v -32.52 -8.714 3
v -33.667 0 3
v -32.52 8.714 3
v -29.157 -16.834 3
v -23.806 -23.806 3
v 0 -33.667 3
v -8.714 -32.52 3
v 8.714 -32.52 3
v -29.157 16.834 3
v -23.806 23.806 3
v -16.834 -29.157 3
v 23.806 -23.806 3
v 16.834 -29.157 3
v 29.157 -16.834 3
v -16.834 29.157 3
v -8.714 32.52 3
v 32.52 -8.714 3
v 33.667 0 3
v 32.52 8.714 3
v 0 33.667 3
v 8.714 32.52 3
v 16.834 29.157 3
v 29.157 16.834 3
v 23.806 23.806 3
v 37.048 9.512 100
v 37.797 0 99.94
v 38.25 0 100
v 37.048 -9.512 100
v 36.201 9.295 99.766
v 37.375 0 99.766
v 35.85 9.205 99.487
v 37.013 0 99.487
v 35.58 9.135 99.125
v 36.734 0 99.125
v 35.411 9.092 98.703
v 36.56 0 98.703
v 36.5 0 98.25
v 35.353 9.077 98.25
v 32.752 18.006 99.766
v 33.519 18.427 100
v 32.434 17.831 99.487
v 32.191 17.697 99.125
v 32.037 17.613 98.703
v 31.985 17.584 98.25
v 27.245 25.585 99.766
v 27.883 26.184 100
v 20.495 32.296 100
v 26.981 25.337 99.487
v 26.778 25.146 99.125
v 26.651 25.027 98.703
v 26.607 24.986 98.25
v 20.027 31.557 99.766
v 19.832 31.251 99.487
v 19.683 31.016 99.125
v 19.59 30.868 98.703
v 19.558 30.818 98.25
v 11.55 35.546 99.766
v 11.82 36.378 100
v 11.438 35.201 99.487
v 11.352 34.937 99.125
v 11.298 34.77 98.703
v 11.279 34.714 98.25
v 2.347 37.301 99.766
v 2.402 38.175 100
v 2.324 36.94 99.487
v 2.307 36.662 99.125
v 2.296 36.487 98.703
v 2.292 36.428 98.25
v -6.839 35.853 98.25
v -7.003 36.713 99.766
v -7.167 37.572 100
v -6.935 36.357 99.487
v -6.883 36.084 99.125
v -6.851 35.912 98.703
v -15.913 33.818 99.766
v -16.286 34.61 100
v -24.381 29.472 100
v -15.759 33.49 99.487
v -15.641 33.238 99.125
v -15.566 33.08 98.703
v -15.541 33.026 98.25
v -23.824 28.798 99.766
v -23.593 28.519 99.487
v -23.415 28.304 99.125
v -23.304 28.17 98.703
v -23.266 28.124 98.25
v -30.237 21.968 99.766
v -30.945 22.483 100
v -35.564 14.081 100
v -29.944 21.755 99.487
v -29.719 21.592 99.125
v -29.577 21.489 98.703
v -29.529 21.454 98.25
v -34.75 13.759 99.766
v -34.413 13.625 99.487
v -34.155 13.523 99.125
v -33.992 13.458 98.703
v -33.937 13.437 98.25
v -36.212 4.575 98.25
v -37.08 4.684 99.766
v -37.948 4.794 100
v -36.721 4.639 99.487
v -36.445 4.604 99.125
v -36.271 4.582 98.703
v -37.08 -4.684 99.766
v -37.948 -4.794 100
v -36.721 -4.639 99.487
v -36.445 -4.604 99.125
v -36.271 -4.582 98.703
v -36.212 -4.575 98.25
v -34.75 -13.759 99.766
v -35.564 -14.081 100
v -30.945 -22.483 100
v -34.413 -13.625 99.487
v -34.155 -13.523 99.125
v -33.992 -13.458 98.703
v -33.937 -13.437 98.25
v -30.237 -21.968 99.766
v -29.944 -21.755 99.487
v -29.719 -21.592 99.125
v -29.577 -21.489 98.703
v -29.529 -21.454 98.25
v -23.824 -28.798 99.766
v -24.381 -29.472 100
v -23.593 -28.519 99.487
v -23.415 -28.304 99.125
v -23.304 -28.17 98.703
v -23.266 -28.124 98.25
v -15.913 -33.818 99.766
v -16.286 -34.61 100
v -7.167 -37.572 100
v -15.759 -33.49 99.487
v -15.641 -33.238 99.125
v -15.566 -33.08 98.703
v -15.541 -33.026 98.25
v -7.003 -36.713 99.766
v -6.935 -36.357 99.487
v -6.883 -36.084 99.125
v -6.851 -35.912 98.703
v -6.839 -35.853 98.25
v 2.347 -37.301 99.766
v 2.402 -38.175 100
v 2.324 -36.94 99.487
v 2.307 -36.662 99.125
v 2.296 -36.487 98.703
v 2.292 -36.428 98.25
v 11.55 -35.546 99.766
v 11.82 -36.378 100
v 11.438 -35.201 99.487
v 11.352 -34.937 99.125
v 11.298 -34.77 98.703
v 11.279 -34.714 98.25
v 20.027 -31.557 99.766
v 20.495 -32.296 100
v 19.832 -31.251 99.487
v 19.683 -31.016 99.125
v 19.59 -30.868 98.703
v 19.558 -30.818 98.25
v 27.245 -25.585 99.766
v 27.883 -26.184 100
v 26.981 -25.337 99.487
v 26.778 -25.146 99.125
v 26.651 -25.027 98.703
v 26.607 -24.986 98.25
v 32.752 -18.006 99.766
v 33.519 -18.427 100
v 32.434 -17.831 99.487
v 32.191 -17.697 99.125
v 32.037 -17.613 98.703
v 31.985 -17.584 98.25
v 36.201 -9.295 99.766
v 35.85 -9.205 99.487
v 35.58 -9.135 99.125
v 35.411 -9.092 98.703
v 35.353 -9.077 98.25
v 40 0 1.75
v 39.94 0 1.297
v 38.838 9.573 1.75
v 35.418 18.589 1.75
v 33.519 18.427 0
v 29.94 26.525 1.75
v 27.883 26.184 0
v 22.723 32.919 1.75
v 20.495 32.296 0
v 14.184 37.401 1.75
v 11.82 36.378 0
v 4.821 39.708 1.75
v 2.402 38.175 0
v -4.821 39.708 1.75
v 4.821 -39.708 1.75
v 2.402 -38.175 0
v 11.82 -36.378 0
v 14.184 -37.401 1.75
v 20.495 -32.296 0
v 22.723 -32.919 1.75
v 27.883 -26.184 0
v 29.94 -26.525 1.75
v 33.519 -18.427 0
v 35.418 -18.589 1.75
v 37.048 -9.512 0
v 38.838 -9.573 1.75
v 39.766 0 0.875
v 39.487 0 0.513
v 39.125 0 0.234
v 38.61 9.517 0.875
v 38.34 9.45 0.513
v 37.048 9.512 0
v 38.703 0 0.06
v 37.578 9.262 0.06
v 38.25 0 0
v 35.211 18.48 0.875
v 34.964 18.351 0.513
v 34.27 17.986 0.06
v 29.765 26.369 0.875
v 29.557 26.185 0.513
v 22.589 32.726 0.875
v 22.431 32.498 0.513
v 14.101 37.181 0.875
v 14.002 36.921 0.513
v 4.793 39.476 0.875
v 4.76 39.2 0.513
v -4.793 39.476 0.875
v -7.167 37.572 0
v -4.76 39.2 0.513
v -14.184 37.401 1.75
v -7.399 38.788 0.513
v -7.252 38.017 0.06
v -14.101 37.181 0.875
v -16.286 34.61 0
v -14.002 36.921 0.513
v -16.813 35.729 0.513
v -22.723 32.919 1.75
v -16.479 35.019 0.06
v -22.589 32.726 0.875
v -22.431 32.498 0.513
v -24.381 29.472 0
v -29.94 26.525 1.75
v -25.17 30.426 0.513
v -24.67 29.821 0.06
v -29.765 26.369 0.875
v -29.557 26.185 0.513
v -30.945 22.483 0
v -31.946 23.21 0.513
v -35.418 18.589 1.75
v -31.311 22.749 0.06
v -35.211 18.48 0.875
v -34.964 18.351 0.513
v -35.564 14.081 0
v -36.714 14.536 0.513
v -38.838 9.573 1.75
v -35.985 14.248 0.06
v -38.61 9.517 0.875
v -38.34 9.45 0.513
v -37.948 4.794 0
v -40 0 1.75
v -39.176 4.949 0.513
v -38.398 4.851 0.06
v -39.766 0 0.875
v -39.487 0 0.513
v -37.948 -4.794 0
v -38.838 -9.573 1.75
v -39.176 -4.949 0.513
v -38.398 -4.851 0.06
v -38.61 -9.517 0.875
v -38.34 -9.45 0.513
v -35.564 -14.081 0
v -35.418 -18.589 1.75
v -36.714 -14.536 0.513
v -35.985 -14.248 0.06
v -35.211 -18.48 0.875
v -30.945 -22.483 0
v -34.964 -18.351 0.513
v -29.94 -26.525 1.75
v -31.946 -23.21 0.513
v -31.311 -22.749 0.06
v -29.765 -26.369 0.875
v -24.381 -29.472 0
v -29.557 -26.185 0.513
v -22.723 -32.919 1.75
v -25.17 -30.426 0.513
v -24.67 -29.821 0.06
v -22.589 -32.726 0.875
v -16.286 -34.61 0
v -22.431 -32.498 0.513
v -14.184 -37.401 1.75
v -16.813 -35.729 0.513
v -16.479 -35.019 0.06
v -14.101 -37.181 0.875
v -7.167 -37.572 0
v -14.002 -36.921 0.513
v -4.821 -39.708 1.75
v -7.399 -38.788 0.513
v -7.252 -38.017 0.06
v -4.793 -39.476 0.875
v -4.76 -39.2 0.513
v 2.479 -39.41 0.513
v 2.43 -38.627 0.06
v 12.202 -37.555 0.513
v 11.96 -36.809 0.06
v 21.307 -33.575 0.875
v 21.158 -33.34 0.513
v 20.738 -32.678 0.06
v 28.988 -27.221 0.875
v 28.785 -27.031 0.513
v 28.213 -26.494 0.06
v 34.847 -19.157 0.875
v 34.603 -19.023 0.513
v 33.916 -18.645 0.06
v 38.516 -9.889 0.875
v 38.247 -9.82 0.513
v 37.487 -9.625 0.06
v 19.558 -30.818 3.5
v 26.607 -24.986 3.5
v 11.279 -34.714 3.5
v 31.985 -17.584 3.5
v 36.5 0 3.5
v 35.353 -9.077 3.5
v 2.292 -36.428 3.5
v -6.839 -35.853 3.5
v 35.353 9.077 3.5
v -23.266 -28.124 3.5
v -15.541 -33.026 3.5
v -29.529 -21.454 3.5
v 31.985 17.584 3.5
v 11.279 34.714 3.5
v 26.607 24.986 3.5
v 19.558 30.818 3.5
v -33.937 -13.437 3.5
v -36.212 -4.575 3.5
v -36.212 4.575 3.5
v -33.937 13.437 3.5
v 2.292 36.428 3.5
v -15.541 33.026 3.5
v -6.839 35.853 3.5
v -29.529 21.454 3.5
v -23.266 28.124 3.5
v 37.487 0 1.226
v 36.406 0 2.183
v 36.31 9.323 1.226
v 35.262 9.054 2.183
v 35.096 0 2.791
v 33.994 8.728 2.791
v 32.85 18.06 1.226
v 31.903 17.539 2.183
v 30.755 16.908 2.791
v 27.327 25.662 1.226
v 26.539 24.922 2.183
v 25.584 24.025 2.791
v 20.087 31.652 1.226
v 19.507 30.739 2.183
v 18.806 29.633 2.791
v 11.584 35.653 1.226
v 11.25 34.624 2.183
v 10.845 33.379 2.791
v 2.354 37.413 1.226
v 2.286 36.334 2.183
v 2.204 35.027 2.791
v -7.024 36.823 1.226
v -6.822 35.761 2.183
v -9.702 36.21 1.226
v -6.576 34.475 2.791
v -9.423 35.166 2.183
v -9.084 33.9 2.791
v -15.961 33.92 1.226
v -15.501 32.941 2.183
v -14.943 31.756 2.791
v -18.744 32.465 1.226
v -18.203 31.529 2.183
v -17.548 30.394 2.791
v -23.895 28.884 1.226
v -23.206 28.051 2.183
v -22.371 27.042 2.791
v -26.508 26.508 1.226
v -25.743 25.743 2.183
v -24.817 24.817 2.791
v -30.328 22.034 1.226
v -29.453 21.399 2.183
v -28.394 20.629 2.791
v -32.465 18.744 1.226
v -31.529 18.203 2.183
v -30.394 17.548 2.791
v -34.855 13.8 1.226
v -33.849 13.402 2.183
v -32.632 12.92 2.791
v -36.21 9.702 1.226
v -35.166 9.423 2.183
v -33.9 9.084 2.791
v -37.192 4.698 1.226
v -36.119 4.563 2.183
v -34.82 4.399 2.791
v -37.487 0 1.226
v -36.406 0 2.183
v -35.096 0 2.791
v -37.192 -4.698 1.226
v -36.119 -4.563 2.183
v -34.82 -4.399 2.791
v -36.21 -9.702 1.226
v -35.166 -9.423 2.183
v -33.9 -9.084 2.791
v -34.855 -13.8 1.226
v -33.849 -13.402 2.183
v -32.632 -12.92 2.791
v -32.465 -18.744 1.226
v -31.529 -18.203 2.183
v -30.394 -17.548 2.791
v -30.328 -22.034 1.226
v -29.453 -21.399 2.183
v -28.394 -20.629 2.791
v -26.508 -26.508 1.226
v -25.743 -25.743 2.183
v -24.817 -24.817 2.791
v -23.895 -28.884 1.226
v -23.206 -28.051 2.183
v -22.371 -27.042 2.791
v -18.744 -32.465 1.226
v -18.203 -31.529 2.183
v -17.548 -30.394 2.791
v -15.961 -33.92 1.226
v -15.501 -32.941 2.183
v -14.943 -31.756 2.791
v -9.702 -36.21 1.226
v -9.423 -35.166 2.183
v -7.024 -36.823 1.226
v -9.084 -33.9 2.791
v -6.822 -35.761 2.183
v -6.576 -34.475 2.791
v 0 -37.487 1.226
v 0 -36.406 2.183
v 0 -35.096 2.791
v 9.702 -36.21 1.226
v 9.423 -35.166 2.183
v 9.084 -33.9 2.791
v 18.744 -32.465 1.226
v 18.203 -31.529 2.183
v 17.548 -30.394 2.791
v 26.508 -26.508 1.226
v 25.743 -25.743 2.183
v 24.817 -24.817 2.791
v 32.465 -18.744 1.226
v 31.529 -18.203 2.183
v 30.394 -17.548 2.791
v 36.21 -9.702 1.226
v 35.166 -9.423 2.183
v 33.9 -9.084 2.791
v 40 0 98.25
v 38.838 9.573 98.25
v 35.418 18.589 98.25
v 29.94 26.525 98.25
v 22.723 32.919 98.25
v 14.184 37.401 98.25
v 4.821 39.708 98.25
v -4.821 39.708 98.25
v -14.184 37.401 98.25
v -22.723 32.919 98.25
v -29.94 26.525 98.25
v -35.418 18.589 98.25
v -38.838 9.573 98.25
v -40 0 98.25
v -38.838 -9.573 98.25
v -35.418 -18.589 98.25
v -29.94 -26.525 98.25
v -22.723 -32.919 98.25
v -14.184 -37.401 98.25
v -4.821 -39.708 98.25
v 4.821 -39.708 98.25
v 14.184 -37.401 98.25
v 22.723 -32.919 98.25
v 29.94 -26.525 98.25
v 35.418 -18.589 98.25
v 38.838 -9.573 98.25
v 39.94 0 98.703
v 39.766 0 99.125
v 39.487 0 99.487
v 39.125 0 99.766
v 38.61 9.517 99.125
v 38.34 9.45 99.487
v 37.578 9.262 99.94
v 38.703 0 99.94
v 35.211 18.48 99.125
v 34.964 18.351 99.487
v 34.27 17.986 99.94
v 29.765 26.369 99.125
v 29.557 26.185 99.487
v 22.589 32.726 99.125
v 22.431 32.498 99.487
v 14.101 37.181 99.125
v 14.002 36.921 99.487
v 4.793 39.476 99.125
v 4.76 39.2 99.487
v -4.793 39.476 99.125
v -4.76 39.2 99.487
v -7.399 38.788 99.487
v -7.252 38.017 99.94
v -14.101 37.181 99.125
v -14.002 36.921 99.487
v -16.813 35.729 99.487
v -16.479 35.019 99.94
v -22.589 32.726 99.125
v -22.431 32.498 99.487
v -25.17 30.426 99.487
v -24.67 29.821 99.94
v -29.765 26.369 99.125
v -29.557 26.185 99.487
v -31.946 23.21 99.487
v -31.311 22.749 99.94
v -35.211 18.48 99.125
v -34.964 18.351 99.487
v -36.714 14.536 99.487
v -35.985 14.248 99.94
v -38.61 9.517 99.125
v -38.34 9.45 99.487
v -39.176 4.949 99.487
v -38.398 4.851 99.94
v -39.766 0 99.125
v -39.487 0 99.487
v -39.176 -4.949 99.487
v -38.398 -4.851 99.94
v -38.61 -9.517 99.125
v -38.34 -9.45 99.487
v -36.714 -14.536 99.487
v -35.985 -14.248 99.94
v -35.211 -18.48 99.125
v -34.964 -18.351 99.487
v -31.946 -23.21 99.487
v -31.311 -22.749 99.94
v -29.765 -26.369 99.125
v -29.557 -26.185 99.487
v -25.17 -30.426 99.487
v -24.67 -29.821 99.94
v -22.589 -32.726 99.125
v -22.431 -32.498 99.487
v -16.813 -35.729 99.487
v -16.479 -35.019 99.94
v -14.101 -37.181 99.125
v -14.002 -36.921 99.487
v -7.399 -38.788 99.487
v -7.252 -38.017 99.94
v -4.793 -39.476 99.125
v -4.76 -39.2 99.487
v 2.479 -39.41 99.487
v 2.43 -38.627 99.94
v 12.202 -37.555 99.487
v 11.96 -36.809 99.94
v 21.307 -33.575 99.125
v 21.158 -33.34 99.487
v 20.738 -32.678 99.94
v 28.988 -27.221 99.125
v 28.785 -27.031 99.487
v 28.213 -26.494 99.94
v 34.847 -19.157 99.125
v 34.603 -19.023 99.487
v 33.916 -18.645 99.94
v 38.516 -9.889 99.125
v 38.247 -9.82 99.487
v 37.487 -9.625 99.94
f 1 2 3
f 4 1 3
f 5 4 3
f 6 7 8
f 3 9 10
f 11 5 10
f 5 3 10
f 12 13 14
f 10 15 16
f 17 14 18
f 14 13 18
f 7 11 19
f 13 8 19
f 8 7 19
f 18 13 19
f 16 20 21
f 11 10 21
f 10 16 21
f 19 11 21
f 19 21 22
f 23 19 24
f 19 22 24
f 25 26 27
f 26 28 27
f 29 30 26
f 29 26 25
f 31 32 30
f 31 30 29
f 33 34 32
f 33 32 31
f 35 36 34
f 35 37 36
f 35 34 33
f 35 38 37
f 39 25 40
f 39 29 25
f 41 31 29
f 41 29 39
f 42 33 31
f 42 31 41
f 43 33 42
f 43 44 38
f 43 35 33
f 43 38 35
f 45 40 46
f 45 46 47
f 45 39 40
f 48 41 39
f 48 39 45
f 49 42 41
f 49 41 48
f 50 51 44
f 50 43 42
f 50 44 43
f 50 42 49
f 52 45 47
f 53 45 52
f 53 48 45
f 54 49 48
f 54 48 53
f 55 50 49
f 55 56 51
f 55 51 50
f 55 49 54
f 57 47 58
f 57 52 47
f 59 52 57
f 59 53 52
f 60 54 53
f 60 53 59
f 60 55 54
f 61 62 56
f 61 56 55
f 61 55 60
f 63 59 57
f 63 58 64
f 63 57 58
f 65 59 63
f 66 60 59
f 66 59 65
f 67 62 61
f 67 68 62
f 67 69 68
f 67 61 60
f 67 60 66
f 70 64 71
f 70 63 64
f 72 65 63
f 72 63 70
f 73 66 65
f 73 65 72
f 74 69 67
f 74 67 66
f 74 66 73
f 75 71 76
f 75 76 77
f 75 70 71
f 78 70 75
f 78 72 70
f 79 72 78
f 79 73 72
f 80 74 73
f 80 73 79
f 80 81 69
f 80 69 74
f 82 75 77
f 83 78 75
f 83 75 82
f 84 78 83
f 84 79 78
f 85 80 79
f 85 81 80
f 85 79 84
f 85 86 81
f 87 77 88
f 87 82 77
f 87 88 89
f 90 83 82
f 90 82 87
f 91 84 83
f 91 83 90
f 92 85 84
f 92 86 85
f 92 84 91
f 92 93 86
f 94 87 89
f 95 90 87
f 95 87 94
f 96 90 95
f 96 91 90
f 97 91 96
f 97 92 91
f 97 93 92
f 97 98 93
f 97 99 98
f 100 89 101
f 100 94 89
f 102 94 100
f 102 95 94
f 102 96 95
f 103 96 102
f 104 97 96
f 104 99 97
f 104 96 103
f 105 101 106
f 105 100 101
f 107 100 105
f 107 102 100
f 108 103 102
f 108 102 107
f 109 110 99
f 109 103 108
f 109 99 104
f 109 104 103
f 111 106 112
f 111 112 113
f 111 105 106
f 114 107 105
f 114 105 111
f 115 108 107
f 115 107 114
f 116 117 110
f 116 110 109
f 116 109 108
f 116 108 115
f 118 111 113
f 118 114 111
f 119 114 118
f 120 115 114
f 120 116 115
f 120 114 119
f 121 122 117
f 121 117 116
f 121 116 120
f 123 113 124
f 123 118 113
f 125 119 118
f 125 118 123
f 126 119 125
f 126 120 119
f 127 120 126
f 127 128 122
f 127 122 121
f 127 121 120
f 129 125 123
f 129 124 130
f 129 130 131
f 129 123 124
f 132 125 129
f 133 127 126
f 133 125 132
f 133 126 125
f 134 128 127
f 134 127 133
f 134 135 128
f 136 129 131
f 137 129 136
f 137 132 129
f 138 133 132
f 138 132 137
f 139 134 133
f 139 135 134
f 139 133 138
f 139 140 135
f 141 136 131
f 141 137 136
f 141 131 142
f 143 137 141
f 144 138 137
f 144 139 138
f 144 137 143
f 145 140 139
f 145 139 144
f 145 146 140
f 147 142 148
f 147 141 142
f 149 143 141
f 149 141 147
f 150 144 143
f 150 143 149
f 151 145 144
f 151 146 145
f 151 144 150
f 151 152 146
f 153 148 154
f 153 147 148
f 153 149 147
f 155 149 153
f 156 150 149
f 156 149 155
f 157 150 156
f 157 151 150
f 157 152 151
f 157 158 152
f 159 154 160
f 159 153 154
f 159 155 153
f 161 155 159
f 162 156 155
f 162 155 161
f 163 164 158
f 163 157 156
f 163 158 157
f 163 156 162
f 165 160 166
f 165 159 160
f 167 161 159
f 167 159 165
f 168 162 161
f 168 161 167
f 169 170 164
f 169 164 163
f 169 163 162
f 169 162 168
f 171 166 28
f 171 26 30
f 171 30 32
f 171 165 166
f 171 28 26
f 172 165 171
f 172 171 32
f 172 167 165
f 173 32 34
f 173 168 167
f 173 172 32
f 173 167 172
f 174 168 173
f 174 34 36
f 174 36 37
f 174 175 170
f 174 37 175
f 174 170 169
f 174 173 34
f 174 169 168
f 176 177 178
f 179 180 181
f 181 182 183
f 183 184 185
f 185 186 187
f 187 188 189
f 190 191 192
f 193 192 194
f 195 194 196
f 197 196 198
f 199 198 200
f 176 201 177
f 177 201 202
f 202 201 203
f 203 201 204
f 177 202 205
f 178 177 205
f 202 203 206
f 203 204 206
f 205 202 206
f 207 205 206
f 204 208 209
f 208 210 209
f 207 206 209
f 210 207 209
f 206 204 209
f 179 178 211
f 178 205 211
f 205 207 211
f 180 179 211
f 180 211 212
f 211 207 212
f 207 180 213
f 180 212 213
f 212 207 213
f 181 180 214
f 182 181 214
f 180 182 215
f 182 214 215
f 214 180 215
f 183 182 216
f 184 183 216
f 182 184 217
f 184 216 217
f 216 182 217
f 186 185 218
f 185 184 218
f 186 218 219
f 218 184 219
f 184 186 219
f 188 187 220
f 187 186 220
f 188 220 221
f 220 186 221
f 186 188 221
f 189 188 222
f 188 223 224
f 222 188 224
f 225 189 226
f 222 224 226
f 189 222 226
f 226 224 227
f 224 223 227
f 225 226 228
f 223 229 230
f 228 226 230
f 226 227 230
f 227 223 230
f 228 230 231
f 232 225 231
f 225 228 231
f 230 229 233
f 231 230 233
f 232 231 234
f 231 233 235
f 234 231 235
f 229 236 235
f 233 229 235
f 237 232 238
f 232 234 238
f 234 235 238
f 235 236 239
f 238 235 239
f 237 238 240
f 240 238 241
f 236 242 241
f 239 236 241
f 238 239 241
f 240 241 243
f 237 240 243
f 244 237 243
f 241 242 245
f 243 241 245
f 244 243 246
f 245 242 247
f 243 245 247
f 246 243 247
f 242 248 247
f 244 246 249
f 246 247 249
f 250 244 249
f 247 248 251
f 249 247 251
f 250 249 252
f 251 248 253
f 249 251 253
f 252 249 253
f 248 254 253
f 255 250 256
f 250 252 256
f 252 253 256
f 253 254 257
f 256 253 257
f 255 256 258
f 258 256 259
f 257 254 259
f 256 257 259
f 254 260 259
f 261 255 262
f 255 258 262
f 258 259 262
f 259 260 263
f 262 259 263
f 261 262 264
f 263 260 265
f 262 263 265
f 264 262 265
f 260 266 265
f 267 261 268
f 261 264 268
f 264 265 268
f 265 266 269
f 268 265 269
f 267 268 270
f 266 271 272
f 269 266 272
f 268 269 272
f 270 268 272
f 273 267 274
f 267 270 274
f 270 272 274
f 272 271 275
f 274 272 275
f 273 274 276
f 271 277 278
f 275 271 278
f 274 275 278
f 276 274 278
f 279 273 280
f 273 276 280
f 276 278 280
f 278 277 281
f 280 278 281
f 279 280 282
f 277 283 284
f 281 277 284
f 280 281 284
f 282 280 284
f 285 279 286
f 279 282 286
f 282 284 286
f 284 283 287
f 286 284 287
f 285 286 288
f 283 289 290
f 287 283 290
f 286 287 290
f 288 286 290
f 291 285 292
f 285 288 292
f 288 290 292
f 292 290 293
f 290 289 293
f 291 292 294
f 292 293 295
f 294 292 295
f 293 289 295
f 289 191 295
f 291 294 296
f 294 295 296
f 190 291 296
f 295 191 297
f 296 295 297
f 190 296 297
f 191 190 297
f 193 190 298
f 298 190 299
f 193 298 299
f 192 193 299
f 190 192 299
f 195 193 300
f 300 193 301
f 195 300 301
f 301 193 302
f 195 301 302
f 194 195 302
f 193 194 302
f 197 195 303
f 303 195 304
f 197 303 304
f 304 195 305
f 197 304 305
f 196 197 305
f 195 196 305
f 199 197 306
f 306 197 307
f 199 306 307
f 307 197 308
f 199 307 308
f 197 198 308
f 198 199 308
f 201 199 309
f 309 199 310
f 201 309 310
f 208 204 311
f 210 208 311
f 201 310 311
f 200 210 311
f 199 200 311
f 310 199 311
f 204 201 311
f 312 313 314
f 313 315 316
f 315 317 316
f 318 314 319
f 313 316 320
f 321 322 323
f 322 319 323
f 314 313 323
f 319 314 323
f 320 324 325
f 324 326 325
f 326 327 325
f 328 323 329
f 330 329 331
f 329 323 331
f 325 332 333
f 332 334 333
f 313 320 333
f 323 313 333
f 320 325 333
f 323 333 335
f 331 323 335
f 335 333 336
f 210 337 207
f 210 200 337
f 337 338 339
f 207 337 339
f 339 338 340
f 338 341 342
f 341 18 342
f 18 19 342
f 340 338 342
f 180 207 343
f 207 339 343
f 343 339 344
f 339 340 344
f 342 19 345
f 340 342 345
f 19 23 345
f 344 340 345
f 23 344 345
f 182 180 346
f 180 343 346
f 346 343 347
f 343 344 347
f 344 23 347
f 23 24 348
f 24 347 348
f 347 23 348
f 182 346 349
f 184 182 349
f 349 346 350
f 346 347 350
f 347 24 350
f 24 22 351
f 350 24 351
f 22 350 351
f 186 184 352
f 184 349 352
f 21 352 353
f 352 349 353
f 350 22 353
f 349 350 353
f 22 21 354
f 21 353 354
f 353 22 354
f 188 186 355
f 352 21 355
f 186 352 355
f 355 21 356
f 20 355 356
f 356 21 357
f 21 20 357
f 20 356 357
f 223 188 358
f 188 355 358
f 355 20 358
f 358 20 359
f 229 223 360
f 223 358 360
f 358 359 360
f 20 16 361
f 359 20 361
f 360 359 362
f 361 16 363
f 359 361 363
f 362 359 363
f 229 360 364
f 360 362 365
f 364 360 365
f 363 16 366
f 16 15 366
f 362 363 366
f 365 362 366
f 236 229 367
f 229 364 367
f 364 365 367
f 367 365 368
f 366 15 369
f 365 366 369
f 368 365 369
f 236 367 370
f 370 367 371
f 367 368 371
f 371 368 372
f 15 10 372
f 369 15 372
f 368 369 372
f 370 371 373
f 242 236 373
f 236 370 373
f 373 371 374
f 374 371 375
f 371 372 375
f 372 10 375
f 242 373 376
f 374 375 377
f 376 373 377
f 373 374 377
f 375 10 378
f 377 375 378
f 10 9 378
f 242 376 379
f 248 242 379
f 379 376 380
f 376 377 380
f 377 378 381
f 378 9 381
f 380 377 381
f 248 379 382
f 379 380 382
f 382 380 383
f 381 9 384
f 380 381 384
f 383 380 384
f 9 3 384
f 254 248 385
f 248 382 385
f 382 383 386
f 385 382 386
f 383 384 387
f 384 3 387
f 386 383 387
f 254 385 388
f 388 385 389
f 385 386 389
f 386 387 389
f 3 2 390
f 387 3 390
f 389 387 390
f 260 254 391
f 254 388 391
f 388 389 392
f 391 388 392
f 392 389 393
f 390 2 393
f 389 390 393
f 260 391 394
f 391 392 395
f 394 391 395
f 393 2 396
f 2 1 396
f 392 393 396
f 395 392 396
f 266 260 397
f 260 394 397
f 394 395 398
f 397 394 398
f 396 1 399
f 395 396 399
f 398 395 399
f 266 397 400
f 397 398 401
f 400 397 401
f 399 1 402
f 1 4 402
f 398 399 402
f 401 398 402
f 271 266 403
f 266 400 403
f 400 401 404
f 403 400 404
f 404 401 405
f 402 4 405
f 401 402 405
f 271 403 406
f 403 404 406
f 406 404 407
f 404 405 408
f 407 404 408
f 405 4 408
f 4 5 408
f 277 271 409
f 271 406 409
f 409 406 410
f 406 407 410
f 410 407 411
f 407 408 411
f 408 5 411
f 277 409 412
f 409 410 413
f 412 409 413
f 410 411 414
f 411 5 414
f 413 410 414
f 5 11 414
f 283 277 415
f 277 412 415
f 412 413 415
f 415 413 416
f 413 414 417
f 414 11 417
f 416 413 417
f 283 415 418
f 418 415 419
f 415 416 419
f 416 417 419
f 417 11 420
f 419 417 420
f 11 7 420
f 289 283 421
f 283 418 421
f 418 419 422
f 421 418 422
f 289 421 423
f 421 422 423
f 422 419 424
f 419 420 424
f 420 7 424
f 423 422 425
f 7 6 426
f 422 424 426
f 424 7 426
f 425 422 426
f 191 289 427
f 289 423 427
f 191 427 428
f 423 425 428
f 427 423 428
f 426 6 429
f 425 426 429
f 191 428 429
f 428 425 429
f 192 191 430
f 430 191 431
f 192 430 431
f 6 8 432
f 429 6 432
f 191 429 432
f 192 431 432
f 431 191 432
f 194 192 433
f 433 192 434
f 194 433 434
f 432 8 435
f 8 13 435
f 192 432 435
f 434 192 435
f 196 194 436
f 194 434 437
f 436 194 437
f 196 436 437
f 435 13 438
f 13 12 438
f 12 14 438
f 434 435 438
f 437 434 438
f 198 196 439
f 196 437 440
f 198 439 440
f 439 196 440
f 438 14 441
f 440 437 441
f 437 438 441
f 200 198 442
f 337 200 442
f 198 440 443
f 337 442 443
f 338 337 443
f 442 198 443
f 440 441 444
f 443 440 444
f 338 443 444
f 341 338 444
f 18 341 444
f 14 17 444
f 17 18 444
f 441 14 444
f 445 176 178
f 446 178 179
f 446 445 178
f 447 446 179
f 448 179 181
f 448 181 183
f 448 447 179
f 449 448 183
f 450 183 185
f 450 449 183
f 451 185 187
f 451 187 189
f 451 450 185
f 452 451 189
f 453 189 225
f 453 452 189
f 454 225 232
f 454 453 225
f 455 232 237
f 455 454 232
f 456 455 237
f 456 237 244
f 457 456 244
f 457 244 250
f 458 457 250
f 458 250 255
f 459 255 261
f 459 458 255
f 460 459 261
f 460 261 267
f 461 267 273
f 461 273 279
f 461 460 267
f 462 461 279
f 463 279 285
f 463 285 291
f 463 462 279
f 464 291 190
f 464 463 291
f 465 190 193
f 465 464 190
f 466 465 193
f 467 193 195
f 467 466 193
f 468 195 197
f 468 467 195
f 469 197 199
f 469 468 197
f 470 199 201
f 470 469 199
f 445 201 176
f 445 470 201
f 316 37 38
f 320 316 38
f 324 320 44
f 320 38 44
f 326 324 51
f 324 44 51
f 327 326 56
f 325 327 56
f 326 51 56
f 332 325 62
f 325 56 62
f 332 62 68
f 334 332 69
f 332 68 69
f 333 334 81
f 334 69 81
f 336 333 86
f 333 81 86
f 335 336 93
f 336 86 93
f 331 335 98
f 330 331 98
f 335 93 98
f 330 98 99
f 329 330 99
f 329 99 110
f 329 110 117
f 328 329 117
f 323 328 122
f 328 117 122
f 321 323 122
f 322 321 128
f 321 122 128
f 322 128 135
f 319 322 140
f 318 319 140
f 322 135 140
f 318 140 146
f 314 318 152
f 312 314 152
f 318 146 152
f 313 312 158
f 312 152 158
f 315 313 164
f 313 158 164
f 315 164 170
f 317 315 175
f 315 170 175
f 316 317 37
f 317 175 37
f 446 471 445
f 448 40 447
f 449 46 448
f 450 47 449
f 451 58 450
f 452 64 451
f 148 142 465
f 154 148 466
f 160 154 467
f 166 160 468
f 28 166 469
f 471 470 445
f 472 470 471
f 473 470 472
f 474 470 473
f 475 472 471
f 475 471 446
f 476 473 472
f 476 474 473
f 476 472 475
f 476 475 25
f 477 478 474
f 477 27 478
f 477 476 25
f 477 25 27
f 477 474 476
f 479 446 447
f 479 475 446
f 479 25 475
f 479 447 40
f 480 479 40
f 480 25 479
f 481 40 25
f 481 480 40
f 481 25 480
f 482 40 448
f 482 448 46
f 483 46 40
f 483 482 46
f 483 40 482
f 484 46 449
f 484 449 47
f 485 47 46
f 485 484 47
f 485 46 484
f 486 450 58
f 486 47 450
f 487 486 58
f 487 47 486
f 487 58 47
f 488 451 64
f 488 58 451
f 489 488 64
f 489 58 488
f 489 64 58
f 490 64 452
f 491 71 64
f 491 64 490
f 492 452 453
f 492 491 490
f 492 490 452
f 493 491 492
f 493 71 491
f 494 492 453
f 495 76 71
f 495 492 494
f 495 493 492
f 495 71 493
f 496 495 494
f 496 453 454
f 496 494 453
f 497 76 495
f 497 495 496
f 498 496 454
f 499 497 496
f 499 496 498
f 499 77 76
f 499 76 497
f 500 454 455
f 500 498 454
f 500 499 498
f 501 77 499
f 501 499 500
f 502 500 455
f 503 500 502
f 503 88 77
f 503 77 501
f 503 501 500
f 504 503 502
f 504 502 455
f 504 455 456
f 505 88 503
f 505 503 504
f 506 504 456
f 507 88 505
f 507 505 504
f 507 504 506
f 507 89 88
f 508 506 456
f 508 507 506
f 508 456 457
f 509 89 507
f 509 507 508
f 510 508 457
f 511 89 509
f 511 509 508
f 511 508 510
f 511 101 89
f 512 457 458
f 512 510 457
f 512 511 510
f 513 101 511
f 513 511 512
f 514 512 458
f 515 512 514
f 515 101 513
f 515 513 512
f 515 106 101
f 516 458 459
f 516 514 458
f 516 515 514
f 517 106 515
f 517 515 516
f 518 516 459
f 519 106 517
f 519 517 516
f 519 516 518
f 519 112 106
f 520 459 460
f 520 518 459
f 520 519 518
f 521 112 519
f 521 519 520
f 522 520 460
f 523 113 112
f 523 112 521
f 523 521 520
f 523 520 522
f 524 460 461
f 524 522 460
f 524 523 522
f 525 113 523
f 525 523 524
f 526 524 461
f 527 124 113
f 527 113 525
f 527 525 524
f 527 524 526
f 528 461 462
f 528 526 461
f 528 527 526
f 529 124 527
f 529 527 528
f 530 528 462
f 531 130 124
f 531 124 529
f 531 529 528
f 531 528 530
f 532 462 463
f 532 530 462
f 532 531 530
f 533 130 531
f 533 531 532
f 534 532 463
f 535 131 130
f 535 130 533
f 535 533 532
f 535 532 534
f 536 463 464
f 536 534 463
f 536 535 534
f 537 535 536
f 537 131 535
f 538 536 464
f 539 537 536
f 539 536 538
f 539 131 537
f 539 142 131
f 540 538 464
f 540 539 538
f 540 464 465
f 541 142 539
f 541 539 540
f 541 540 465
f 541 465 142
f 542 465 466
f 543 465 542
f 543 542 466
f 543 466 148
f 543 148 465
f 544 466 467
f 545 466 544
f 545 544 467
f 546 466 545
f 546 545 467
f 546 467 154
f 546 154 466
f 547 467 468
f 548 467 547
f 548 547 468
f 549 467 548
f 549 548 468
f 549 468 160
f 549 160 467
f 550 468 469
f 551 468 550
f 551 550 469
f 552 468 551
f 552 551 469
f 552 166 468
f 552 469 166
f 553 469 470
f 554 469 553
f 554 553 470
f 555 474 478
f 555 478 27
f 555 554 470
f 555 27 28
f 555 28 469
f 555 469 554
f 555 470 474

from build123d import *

# Parameters (mm, degrees)
F2_T     = -3.5
F3_R     = 1.74999
F4_R     = 38.25
F5_DEPTH = 3
F6_R     = 1.74999


# Not quite as in the source:
# - a fillet or chamfer that OpenCascade refuses, or shapes differently, is made with other operations: its cross-section is extruded or revolved along the edge and cut away or added
# - a fillet or chamfer is up to 0.001 mm smaller than in the source, because OpenCascade refuses the exact size


with BuildPart() as f1:
    # F0 (on Front) → F1 (revolve)
    with BuildSketch(Plane.XZ):
        with BuildLine():
            Line((0, 100), (0, 0))
            Line((0, 0), (40, 0))
            Line((40, 0), (40, 9.3798986314))
            add(Edge.make_bspline(
                [(40, 9.3798986314), (36.3615811377, 9.5180089921), (32.7559413641, 9.8779920191), (29.1503015906, 10.237975046)],
                knots=[0.9214250826, 0.9214250826, 0.9214250826, 0.9214250826, 1, 1, 1, 1], degree=3))
            Line((29.1503015906, 10.237975046), (30.0444061749, 19.1934501913))
            add(Edge.make_bspline(
                [(40, 18.3365735612), (39.0117054739, 18.370443261), (36.643767227, 18.4954262507), (33.3320197728, 18.8677992603), (31.0010337577, 19.1072868184), (30.0444061749, 19.1934501913)],
                knots=[113.3617815831, 113.3617815831, 113.3617815831, 113.3617815831, 116.3275721529, 120.4741421163, 123.3563956747, 123.3563956747, 123.3563956747, 123.3563956747], degree=3))
            Line((40, 18.3365735612), (40, 73.0902536278))
            add(Edge.make_bspline(
                [(31.7338511682, 71.8869126854), (32.4007501321, 71.9844232047), (34.386427689, 72.278853309), (37.1398587874, 72.6929898238), (39.229939508, 72.9860445189), (40, 73.0902536278)],
                knots=[0, 0, 0, 0, 2.0219920564, 6.0221045926, 8.3532693238, 8.3532693238, 8.3532693238, 8.3532693238], degree=3))
            Line((31.7338511682, 71.8869126854), (30.4177049547, 80.7901546359))
            add(Edge.make_bspline(
                [(30.4177049547, 80.7901546359), (33.6321840052, 81.2653438371), (36.8466630556, 81.7405330383), (40, 82.1441317937)],
                knots=[0, 0, 0, 0, 0.0502198484, 0.0502198484, 0.0502198484, 0.0502198484], degree=3))
            Line((40, 82.1441317937), (40, 100))
            Line((40, 100), (0, 100))
        make_face()
        with BuildLine():
            Line((40, 73.0902536278), (40, 82.1441317937))
            add(Edge.make_bspline(
                [(30.4177049547, 80.7901546359), (33.6321840052, 81.2653438371), (36.8466630556, 81.7405330383), (40, 82.1441317937)],
                knots=[0, 0, 0, 0, 0.0502198484, 0.0502198484, 0.0502198484, 0.0502198484], degree=3))
            Line((30.4177049547, 80.7901546359), (31.7338511682, 71.8869126854))
            add(Edge.make_bspline(
                [(31.7338511682, 71.8869126854), (32.4007501321, 71.9844232047), (34.386427689, 72.278853309), (37.1398587874, 72.6929898238), (39.229939508, 72.9860445189), (40, 73.0902536278)],
                knots=[0, 0, 0, 0, 2.0219920564, 6.0221045926, 8.3532693238, 8.3532693238, 8.3532693238, 8.3532693238], degree=3))
        make_face()
        with BuildLine():
            add(Edge.make_bspline(
                [(40, 9.3798986314), (36.3615811377, 9.5180089921), (32.7559413641, 9.8779920191), (29.1503015906, 10.237975046)],
                knots=[0.9214250826, 0.9214250826, 0.9214250826, 0.9214250826, 1, 1, 1, 1], degree=3))
            Line((40, 9.3798986314), (40, 18.3365735612))
            add(Edge.make_bspline(
                [(40, 18.3365735612), (39.0117054739, 18.370443261), (36.643767227, 18.4954262507), (33.3320197728, 18.8677992603), (31.0010337577, 19.1072868184), (30.0444061749, 19.1934501913)],
                knots=[113.3617815831, 113.3617815831, 113.3617815831, 113.3617815831, 116.3275721529, 120.4741421163, 123.3563956747, 123.3563956747, 123.3563956747, 123.3563956747], degree=3))
            Line((30.0444061749, 19.1934501913), (29.1503015906, 10.237975046))
        make_face()
    revolve(axis=Axis((0, 0, 50), (0, 0, 1)))

    # F2
    f2_openings = [f1.faces().sort_by_distance(p)[0] for p in [
        (0, 0, 100),
    ]]
    offset(amount=F2_T, openings=f2_openings)

    # F3 (radius 1.75 in the source; OpenCascade refuses exactly that, so slightly less here)
    f3_edges = [f1.edges().sort_by_distance(p)[0] for p in [
        (-40, 0, 100),
        (-36.5, 0, 100),
    ]]
    fillet(f3_edges, radius=F3_R)

    # F4 (on Top) → F5 (cut)
    with BuildSketch(Plane.XY):
        Circle(F4_R)
    extrude(amount=F5_DEPTH, mode=Mode.SUBTRACT)

    # F6 (radius 1.75 in the source; OpenCascade refuses exactly that, so slightly less here)
    f6_edges = [f1.edges().sort_by_distance(p)[0] for p in [
        (-40, 0, 0),
    ]]
    fillet(f6_edges, radius=F6_R)

    # F7: fillet of radius 5 on 1 edges, made by hand

    # F7_s1 → F7_t2 (revolve)
    with BuildSketch(Plane.XZ):
        with BuildLine():
            ThreePointArc((38.25, 0), (36.4060370926, 2.1833001327), (33.667424305, 3))
            Line((33.667424305, 3), (38.25, 3))
            Line((38.25, 3), (38.25, 0))
        make_face()
    revolve(axis=Axis((0, 0, 3), (0, 0, 1)))


solid = f1.part
